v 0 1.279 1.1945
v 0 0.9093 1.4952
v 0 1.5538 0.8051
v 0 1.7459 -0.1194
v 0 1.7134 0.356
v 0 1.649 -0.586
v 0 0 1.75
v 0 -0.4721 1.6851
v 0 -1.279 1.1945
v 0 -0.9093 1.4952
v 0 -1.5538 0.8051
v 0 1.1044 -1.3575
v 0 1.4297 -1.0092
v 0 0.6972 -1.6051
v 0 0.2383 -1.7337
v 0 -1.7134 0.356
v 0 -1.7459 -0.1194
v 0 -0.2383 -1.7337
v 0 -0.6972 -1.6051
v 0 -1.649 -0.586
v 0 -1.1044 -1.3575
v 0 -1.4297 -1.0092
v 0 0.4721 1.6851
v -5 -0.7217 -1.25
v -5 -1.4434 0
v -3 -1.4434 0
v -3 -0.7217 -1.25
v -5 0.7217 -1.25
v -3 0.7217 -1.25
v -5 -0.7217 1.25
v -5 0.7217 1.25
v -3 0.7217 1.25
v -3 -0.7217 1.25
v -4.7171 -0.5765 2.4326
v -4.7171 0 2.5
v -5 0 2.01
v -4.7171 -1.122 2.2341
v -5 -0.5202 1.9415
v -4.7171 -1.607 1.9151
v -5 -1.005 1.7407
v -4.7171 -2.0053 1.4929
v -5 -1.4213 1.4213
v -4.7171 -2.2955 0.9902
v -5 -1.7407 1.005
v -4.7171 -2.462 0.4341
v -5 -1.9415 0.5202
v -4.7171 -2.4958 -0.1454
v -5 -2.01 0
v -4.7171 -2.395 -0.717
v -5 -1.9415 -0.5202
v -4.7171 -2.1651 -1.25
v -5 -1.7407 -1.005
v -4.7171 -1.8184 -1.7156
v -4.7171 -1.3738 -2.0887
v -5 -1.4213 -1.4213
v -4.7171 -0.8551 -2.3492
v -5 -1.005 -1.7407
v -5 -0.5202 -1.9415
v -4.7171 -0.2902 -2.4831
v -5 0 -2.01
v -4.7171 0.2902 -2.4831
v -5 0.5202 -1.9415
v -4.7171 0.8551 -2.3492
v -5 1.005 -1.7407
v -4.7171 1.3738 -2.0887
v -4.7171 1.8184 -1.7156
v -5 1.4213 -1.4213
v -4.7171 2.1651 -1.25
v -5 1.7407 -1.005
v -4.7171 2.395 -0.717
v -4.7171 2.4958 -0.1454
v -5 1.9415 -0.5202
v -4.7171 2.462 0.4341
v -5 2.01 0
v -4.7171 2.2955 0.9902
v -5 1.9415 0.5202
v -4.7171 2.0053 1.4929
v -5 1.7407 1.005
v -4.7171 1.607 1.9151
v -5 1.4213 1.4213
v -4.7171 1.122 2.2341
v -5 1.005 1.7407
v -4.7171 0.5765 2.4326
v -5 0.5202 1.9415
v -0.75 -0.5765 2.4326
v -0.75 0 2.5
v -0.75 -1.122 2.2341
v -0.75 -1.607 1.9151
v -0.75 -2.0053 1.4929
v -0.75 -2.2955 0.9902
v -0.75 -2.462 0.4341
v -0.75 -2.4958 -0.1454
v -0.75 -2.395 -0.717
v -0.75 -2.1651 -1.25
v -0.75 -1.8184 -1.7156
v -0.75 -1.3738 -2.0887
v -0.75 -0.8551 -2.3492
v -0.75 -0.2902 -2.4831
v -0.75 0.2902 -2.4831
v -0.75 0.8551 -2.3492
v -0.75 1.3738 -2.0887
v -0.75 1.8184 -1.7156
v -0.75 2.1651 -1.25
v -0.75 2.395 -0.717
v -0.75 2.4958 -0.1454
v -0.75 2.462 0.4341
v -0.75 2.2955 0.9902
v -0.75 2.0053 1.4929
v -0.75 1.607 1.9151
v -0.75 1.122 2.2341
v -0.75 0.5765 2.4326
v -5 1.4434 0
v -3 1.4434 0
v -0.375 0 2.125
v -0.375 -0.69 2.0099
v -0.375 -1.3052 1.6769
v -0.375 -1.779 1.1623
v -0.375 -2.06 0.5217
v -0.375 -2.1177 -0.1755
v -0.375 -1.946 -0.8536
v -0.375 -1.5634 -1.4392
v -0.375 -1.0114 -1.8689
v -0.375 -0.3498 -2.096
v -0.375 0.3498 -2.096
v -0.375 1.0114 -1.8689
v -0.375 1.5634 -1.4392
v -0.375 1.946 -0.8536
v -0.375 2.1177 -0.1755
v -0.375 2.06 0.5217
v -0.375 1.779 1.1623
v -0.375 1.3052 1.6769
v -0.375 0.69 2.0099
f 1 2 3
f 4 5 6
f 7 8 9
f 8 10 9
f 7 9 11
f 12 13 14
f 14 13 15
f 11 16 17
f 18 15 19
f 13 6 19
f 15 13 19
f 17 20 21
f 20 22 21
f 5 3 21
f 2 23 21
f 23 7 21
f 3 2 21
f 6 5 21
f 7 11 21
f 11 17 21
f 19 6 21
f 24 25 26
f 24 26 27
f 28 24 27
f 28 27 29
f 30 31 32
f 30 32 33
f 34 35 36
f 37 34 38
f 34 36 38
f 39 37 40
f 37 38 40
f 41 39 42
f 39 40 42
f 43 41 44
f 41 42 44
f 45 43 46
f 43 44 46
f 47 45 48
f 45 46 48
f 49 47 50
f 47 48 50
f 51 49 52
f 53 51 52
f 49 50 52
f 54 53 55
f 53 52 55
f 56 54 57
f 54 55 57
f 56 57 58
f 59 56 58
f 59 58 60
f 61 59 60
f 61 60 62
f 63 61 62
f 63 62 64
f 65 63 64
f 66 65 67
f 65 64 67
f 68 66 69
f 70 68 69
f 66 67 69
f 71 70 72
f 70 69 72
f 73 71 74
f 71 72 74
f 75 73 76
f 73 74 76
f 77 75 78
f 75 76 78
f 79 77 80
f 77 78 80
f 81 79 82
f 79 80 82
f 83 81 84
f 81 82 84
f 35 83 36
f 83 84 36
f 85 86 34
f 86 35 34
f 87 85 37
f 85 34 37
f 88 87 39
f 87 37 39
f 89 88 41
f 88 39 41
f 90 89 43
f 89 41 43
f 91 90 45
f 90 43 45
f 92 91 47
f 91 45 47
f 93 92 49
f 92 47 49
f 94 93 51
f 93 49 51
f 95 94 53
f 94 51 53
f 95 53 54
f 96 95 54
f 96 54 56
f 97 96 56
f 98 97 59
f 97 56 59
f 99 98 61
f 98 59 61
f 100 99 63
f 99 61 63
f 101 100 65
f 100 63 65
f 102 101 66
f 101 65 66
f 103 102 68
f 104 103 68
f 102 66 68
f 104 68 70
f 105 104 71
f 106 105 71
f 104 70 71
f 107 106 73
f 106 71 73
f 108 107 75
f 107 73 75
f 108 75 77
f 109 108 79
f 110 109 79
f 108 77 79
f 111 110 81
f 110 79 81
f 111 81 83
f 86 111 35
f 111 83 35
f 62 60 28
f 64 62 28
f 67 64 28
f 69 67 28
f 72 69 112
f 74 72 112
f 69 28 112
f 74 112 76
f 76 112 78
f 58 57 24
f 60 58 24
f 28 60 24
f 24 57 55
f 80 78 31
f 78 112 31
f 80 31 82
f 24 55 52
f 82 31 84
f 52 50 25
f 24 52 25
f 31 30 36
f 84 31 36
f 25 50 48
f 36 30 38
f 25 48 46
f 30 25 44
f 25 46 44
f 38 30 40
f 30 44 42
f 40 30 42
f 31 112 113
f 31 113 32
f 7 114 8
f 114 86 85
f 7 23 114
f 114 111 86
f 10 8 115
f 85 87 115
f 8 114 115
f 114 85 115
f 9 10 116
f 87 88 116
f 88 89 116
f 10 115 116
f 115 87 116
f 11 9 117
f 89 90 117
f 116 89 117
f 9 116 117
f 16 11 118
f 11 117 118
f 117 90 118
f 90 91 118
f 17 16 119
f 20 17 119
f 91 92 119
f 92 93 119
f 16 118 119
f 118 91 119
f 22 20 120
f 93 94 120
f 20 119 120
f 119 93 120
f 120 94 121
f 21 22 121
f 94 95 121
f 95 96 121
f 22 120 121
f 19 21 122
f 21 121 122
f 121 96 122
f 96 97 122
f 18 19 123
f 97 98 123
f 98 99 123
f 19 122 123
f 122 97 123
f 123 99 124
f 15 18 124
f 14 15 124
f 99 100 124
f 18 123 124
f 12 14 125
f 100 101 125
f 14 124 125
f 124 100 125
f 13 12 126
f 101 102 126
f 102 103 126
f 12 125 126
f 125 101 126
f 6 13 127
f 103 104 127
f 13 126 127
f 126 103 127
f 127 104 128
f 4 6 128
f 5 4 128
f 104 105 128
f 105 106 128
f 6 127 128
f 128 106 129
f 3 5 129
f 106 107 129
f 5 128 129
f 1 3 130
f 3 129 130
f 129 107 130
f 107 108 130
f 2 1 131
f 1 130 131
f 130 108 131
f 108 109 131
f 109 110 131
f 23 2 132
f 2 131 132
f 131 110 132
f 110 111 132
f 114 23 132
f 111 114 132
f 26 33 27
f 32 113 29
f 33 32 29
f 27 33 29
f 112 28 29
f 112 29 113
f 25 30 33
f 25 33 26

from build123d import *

# Parameters (mm, degrees)
CUT_EXTRUDE1_DEPTH = 2


with BuildPart() as part:
    # Sketch1 → Revolve1 (revolve)
    with BuildSketch(Plane.XY, mode=Mode.PRIVATE) as revolve1_sk:
        Polygon((0, 0), (0, 1.75), (-0.75, 2.5), (-4.717098368, 2.5), (-5, 2.01), (-5, 0), align=None)
    revolve(revolve1_sk.sketch.rotate(Axis((-5, 0, 0), (1, 0, 0)), 90), axis=Axis((-5, 0, 0), (1, 0, 0)))

    # Sketch2 → Cut-Extrude1 (cut)
    with BuildSketch(Plane(origin=(-5, 0, 0), x_dir=(0, 0, -1), z_dir=(1, 0, 0))):
        Polygon((1.25, -0.721687836), (1.25, 0.721687836), (0, 1.443375673), (-1.25, 0.721687836), (-1.25, -0.721687836), (0, -1.443375673), align=None)
    extrude(amount=CUT_EXTRUDE1_DEPTH, mode=Mode.SUBTRACT)


solid = part.part
